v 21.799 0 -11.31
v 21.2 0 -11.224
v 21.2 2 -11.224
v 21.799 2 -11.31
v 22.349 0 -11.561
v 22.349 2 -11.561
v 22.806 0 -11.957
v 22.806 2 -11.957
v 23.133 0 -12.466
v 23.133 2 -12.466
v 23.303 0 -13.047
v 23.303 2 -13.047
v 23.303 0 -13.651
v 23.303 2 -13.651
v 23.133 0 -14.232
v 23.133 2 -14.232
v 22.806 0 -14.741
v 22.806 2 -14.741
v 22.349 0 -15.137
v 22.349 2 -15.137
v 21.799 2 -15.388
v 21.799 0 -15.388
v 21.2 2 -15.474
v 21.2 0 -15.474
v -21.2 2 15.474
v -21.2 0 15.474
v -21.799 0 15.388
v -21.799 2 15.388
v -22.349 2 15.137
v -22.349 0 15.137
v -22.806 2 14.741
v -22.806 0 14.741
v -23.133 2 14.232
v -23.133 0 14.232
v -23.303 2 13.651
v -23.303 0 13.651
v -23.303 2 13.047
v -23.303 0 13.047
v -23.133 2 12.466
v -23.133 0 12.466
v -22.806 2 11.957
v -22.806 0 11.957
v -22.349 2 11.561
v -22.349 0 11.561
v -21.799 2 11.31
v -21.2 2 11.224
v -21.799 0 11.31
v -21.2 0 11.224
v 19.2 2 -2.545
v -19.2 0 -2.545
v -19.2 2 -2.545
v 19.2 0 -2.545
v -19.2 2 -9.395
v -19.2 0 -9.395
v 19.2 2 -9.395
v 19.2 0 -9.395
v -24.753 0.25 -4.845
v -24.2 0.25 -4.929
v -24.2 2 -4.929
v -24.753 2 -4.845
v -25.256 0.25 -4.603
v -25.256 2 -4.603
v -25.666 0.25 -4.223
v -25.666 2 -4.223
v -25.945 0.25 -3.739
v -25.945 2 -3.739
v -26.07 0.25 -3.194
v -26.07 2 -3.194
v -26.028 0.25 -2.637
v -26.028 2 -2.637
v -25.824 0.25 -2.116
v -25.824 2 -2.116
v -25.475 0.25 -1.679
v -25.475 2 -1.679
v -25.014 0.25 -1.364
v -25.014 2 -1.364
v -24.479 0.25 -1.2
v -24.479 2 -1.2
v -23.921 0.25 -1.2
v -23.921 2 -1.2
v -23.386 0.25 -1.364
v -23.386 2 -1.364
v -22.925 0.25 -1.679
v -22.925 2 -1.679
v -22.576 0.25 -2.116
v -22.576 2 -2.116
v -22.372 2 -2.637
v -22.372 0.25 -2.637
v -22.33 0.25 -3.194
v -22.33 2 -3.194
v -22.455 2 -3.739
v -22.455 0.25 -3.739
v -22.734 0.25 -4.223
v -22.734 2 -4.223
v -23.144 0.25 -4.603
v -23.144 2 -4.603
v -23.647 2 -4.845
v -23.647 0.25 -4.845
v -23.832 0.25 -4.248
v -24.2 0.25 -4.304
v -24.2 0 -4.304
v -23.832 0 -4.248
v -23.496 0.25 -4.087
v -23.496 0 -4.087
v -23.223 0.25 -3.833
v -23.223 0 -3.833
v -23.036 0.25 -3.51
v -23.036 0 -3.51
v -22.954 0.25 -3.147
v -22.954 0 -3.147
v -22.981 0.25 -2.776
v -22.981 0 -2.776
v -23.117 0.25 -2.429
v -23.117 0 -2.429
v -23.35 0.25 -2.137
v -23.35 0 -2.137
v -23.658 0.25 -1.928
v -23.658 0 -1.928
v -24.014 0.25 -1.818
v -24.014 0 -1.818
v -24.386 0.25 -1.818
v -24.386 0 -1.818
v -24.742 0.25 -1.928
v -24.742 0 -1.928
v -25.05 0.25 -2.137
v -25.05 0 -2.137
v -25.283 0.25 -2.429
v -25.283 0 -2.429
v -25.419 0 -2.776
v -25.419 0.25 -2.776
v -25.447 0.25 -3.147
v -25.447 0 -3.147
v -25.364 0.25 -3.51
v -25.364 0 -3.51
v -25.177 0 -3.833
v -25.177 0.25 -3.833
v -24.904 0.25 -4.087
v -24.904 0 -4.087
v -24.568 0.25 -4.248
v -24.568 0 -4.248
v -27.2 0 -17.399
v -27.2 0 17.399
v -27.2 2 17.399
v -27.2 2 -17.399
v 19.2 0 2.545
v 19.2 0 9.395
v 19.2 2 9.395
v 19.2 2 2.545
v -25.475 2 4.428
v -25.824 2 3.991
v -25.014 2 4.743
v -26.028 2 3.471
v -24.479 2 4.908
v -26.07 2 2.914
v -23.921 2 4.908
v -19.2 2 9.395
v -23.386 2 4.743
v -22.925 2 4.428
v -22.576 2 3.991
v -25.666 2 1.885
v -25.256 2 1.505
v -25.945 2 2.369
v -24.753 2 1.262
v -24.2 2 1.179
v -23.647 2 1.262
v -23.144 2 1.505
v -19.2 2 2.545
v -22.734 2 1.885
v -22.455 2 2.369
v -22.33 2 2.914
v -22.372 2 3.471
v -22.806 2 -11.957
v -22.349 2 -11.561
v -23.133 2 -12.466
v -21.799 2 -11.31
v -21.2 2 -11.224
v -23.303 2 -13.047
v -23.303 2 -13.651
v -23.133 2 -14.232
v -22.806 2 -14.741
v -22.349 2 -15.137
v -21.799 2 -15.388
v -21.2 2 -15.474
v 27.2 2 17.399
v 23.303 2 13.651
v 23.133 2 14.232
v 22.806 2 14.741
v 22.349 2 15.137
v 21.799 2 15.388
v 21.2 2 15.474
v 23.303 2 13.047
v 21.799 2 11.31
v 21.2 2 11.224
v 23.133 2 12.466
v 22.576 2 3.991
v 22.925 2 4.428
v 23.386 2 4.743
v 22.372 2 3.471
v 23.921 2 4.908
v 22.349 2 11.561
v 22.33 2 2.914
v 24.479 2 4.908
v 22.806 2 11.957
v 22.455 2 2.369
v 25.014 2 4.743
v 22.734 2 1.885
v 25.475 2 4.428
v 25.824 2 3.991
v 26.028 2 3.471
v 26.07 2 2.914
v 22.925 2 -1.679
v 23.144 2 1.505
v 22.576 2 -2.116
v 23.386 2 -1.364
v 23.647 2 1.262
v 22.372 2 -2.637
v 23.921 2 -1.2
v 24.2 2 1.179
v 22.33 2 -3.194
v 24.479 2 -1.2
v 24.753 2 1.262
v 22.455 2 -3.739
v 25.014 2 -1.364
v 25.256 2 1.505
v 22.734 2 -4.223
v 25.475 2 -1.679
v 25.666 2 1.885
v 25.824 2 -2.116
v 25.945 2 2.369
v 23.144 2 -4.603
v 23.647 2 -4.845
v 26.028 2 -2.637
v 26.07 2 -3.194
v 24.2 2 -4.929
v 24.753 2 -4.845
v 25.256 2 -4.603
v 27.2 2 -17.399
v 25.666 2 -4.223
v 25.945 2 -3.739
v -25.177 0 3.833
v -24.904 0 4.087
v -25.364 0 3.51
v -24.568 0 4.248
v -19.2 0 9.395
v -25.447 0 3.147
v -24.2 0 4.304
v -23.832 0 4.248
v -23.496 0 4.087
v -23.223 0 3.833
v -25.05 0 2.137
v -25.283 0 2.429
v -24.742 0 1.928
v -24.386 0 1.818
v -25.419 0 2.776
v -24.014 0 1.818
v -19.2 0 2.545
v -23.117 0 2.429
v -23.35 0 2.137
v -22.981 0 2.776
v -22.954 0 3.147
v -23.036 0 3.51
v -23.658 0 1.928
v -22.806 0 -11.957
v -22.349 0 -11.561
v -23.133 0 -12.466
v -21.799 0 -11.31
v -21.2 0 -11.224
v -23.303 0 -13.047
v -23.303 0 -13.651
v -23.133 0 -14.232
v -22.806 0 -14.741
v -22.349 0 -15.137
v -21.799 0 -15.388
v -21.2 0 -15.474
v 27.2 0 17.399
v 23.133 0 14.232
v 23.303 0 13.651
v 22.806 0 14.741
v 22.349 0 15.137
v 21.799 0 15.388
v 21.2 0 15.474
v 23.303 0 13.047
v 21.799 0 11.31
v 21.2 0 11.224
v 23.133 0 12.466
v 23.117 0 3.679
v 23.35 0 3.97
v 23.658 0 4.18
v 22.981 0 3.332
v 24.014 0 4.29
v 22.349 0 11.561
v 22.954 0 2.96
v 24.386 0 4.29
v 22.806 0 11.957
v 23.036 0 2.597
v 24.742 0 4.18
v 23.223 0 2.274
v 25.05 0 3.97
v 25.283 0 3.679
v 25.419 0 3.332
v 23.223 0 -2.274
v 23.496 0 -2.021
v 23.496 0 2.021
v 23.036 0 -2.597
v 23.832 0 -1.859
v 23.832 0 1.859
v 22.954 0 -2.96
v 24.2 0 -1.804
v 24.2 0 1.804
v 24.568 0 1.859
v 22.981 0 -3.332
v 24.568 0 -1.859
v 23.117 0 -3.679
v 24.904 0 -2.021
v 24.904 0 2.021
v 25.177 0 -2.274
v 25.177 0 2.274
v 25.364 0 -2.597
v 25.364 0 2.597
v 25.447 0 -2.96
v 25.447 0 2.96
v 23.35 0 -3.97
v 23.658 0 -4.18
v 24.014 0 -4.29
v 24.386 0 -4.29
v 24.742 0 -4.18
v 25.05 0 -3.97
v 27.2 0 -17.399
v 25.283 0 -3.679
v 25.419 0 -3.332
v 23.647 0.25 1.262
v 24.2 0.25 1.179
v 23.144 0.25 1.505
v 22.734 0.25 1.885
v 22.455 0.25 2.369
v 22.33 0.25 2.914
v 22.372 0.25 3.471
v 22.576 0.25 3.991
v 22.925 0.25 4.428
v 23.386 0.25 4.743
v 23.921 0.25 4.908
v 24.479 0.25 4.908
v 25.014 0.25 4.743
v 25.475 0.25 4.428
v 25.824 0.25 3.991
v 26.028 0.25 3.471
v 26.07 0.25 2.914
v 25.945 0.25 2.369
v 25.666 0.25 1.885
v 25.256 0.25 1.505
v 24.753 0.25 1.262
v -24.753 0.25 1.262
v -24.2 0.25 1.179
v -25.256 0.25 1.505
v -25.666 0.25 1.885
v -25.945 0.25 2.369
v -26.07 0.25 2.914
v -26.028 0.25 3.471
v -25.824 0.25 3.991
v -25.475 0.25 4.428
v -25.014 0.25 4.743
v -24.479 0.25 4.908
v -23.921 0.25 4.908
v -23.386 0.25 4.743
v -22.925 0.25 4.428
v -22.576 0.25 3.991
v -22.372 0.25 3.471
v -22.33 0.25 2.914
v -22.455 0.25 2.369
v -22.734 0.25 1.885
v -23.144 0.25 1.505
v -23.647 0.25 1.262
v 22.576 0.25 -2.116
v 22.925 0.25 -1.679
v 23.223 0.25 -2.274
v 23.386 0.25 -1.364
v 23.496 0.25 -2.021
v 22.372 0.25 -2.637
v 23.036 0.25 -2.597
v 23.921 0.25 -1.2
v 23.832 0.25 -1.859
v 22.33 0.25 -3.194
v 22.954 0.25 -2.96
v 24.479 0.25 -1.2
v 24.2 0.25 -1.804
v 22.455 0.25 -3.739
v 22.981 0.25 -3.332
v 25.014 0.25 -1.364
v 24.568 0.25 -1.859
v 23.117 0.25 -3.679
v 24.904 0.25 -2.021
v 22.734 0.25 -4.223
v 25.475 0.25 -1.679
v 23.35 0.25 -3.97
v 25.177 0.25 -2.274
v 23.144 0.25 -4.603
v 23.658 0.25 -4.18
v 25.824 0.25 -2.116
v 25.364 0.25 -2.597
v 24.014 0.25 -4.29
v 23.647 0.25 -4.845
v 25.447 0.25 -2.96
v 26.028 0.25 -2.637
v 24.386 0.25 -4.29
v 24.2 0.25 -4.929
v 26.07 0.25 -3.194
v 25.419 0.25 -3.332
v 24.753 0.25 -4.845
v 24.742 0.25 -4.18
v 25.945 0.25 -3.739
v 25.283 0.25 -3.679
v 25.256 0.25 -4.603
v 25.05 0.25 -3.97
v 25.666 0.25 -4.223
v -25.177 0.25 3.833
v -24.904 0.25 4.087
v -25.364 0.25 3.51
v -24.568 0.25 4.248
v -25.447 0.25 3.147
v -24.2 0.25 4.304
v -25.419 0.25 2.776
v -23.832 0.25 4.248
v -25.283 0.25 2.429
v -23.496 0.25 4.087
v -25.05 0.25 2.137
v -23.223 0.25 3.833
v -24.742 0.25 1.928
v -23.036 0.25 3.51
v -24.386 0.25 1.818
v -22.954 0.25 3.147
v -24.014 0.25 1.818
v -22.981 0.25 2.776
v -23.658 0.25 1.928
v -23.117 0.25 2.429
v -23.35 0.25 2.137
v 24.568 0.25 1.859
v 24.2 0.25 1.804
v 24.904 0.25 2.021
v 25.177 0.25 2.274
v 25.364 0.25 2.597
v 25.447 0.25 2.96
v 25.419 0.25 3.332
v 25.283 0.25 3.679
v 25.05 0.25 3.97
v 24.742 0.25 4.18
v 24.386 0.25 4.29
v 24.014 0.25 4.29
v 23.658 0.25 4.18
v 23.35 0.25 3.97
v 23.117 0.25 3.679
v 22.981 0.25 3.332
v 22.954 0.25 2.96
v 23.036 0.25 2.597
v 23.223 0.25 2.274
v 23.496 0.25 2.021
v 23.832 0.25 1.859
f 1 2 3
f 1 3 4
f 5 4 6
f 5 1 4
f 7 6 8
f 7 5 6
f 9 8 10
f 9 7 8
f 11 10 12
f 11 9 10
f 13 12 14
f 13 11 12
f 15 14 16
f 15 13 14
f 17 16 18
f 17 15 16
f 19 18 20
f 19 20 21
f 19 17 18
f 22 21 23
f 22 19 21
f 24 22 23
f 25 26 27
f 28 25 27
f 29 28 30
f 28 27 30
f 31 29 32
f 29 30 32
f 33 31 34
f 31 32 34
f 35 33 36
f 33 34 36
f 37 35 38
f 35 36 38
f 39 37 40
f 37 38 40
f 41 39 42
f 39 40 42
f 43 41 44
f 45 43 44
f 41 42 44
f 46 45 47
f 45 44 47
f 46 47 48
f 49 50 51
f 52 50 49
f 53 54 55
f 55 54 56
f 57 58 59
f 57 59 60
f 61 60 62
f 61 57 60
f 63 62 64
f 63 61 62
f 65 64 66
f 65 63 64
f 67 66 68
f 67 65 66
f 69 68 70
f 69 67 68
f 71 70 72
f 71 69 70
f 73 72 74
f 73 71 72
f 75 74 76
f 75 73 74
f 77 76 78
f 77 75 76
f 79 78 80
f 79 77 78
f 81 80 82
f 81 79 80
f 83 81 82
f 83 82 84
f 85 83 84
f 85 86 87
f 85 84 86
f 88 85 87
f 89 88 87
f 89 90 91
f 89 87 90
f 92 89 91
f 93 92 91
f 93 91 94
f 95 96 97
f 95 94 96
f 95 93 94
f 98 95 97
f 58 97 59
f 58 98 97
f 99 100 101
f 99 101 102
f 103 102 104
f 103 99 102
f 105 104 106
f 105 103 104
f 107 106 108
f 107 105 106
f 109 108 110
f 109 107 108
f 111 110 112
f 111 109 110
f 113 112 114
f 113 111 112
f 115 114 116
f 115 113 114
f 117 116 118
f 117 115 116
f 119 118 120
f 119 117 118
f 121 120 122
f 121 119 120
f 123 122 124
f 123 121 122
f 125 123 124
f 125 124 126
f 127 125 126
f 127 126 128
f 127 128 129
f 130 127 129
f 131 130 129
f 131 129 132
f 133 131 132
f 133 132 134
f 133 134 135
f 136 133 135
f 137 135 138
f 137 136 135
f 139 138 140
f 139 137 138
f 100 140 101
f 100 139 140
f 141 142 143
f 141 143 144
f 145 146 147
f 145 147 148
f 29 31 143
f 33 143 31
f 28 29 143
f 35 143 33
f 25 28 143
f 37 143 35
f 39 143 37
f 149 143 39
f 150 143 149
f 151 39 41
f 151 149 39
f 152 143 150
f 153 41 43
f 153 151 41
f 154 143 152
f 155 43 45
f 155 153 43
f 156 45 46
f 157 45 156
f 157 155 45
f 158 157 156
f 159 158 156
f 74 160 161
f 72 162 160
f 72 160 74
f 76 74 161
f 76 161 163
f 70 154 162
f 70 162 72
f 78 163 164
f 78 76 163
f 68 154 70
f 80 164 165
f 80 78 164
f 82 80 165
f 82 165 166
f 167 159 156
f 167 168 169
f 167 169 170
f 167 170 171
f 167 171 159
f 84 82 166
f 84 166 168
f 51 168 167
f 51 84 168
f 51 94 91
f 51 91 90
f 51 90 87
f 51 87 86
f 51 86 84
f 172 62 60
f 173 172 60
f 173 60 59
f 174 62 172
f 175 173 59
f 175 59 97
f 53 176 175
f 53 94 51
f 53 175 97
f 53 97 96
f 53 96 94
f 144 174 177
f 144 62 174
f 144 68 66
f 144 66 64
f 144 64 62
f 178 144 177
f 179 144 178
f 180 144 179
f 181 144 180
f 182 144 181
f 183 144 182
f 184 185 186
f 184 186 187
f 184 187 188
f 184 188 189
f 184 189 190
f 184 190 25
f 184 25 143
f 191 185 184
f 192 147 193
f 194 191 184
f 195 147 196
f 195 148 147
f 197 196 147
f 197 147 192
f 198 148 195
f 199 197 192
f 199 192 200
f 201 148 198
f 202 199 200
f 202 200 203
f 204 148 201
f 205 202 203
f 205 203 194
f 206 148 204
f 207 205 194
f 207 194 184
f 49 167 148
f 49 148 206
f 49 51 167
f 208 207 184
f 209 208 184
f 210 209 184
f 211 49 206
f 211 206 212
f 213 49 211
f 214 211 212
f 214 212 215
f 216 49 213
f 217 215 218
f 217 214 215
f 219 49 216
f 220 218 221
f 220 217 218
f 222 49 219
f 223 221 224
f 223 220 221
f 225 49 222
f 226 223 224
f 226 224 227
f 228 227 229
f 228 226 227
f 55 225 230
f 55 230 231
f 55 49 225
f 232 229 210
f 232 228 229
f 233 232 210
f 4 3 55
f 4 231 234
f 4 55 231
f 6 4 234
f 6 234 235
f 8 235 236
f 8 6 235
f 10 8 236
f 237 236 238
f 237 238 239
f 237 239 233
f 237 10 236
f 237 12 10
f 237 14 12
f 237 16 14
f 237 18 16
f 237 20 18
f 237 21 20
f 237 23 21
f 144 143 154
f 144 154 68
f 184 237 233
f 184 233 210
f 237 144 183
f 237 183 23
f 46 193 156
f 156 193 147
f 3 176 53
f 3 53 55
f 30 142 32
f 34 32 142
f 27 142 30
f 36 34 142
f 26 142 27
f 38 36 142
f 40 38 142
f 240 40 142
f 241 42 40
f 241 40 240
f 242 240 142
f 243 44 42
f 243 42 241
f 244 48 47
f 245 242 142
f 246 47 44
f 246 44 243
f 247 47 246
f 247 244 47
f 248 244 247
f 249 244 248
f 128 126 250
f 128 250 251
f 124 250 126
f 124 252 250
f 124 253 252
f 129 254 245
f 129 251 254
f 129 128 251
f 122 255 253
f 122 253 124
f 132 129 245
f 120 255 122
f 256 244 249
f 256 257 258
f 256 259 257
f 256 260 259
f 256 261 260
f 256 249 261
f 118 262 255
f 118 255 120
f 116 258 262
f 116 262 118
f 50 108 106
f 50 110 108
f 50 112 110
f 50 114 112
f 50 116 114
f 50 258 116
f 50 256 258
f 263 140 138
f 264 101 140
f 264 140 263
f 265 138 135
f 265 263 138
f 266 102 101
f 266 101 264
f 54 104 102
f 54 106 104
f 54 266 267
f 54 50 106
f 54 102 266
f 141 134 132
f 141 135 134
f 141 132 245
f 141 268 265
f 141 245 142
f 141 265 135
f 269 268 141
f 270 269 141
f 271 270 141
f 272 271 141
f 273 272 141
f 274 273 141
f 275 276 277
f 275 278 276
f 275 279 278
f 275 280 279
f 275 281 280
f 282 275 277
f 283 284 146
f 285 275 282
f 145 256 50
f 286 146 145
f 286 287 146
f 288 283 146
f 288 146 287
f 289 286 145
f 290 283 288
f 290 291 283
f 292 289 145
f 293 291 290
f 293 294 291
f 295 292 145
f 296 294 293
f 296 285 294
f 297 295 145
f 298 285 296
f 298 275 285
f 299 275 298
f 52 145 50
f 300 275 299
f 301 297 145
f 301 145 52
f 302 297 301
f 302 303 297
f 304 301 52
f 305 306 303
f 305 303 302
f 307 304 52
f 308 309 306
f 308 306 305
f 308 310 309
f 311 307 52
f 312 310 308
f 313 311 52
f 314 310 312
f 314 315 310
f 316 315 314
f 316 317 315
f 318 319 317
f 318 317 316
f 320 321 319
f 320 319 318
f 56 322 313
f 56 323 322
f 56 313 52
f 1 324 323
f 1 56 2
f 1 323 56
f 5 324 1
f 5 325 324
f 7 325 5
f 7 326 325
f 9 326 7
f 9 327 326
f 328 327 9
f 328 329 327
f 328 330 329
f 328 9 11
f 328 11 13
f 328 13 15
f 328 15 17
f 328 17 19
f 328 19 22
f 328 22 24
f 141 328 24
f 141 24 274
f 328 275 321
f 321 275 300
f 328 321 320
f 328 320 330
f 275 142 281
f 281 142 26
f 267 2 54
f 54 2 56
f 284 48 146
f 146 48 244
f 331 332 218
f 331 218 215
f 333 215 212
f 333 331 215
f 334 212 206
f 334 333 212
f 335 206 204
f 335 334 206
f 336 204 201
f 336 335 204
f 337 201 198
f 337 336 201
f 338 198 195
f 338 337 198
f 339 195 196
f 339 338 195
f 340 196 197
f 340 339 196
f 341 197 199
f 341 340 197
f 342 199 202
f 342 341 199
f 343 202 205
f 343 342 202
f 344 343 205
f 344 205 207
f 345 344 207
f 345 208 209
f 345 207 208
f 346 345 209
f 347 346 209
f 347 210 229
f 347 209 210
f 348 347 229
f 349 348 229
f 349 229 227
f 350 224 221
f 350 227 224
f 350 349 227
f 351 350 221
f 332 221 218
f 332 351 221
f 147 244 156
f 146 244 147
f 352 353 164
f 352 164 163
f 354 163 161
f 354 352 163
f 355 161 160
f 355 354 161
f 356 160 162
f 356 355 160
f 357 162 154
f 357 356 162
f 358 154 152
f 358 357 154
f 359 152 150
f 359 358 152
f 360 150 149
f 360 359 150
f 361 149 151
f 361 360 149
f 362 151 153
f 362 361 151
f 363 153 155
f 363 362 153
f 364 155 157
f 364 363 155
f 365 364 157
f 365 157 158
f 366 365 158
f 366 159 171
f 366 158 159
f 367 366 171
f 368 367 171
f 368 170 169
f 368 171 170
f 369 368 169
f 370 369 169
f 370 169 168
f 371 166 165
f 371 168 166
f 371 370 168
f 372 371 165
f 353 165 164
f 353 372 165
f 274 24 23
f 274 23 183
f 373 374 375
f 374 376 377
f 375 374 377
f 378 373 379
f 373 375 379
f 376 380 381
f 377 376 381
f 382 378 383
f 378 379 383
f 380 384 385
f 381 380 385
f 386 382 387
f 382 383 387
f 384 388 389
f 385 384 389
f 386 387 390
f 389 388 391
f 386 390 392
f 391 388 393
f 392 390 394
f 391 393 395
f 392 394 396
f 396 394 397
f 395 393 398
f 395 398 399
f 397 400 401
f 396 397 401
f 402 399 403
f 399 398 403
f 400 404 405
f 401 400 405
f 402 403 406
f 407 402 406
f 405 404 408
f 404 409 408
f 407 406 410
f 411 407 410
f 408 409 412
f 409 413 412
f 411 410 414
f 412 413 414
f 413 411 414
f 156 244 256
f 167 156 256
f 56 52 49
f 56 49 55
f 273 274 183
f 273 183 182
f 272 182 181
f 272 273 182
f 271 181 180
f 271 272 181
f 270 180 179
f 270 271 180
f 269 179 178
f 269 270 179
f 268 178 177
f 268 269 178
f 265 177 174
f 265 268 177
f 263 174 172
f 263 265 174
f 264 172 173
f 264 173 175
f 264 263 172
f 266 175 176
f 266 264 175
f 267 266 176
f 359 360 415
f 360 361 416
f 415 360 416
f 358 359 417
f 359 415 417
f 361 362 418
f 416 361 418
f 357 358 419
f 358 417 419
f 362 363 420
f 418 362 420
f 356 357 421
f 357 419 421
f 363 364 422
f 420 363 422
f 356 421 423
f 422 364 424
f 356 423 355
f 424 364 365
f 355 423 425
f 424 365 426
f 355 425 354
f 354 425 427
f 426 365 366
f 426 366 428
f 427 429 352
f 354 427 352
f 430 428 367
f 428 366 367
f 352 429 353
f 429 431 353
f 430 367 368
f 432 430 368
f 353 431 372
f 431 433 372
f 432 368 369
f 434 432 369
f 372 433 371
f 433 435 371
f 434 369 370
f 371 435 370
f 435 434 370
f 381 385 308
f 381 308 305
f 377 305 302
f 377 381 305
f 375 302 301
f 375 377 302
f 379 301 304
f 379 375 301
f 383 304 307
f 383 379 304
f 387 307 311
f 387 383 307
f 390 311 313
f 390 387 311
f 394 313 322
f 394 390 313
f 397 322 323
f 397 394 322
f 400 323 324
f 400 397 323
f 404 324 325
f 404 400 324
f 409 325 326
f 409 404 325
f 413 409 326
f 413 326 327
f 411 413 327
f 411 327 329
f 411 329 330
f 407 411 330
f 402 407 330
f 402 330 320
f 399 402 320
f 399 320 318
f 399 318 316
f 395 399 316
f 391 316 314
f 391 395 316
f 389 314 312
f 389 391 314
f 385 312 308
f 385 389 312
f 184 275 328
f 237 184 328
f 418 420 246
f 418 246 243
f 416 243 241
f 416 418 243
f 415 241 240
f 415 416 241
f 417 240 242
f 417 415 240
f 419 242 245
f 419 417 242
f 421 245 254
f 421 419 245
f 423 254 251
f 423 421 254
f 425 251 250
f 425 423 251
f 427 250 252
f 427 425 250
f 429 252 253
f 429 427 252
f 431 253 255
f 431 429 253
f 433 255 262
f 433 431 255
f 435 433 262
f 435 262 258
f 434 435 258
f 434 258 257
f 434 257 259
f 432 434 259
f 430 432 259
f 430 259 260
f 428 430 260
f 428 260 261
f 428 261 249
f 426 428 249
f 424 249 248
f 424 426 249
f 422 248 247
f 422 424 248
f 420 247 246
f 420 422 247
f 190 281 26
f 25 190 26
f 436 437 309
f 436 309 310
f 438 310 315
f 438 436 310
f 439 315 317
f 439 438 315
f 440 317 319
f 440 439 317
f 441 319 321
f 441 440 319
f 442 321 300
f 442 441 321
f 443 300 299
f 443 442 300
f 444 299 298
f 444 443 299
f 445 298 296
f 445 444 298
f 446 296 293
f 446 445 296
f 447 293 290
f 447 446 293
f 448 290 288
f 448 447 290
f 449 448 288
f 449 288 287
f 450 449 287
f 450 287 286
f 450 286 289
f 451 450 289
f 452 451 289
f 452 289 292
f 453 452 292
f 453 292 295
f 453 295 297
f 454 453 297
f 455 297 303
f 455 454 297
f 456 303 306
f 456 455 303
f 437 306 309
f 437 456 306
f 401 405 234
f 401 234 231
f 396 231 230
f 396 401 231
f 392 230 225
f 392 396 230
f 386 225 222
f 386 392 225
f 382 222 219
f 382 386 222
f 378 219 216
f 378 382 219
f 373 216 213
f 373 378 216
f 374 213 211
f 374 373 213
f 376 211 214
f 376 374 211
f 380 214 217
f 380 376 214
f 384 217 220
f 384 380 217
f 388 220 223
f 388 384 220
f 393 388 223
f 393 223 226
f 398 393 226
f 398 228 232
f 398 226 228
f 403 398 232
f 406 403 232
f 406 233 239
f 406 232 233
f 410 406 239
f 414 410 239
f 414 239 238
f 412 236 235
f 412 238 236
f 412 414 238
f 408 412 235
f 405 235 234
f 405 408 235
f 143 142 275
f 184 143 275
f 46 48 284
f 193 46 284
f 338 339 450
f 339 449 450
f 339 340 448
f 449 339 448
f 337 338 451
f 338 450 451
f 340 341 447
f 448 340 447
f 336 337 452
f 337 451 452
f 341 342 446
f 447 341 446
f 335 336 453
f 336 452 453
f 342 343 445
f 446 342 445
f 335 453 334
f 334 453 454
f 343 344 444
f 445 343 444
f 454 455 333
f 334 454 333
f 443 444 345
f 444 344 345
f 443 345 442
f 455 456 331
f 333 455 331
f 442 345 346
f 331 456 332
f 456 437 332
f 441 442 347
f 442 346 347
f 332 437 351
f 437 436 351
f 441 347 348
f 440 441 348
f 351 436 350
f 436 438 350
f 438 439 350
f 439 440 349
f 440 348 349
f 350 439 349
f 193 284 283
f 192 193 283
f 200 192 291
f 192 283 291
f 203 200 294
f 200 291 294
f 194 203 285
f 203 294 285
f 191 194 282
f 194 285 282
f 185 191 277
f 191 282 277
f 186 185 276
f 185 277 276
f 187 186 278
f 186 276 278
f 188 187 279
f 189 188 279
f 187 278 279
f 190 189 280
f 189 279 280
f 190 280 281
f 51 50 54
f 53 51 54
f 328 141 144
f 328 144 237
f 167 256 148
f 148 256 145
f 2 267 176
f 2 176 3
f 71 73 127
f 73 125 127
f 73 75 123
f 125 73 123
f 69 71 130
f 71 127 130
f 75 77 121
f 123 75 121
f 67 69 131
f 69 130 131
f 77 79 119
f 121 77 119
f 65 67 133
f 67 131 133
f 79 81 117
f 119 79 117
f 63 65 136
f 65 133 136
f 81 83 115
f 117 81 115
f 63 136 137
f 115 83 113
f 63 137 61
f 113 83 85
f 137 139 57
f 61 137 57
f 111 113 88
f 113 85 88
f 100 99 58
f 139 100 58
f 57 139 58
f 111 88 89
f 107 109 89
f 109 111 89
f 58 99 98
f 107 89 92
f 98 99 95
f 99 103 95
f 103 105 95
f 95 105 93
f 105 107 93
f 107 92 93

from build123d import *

# Parameters (mm, degrees)
SKETCH1_W               = 54.3999928
SKETCH1_H               = 34.798
SKETCH1_W_2             = 38.3999994
SKETCH1_H_2             = 6.849999
BOSS_EXTRUDE1_DEPTH     = 1.999996
CUT_EXTRUDE1_DEPTH      = 33.350656704
CUT_EXTRUDE1_DEPTH_BACK = 5.5500016
SKETCH2_R               = 1.8750026
BOSS_EXTRUDE2_START     = -0.2500122
SKETCH3_R               = 1.8750026
SKETCH3_R_2             = 1.2499975
BOSS_EXTRUDE2_DEPTH     = 0.2500122


with BuildPart() as part:
    # Sketch1 → Boss-Extrude1 (new body)
    with BuildSketch(Plane(origin=(0, 0, 0), x_dir=(1, 0, 0), z_dir=(0, 1, 0))):
        Rectangle(SKETCH1_W, SKETCH1_H)
        with BuildLine():
            Line((-21.2000084, -11.224006), (21.2000084, -11.224006))
            ThreePointArc((21.2000084, -11.224006), (23.3250105, -13.3490081), (21.2000084, -15.4740102))
            Line((21.2000084, -15.4740102), (-21.2000084, -15.4740102))
            ThreePointArc((-21.2000084, -15.4740102), (-23.3250105, -13.3490081), (-21.2000084, -11.224006))
        make_face(mode=Mode.SUBTRACT)
        with BuildLine():
            Line((-21.2000084, 11.224006), (21.2000084, 11.224006))
            ThreePointArc((21.2000084, 11.224006), (23.3250105, 13.3490081), (21.2000084, 15.4740102))
            Line((21.2000084, 15.4740102), (-21.2000084, 15.4740102))
            ThreePointArc((-21.2000084, 15.4740102), (-23.3250105, 13.3490081), (-21.2000084, 11.224006))
        make_face(mode=Mode.SUBTRACT)
        with Locations((-1.27e-05, 5.9702065)):
            Rectangle(SKETCH1_W_2, SKETCH1_H_2, mode=Mode.SUBTRACT)
        with Locations((-1.27e-05, -5.9702065)):
            Rectangle(SKETCH1_W_2, SKETCH1_H_2, mode=Mode.SUBTRACT)
    extrude(amount=BOSS_EXTRUDE1_DEPTH)

    # Sketch2 → Cut-Extrude1 (cut, two sides: drawn at the far end of the back side and taken through both)
    with BuildSketch(Plane(origin=(0, 1.999996, 0), x_dir=(1, 0, 0), z_dir=(0, 1, 0)).offset(-CUT_EXTRUDE1_DEPTH_BACK)):
        with Locations(Location((-24.2000278, -3.0537912, 0), (0, 0, 90))):
            Circle(SKETCH2_R)
        with Locations(Location((-24.2000278, 3.0537912, 0), (0, 0, 90))):
            Circle(SKETCH2_R)
        with Locations(Location((24.2000278, 3.0537912, 0), (0, 0, 90))):
            Circle(SKETCH2_R)
        with Locations(Location((24.2000278, -3.0537912, 0), (0, 0, 90))):
            Circle(SKETCH2_R)
    extrude(amount=CUT_EXTRUDE1_DEPTH + CUT_EXTRUDE1_DEPTH_BACK, mode=Mode.SUBTRACT)

    # Sketch3 → Boss-Extrude2 (add)
    # profile 1 of 4: a face of its own
    with BuildSketch(Plane.XZ.offset(BOSS_EXTRUDE2_START)):
        with Locations(Location((-24.2000278, 3.0537912, 0), (0, 0, 270))):
            Circle(SKETCH3_R)
        with Locations(Location((-24.2000278, 3.0537912, 0), (0, 0, 90))):
            Circle(SKETCH3_R_2, mode=Mode.SUBTRACT)
    # profile 2 of 4: a face of its own
    with BuildSketch(Plane.XZ.offset(BOSS_EXTRUDE2_START)):
        with Locations(Location((-24.2000278, -3.0537912, 0), (0, 0, 270))):
            Circle(SKETCH3_R)
        with Locations(Location((-24.2000278, -3.0537912, 0), (0, 0, 270))):
            Circle(SKETCH3_R_2, mode=Mode.SUBTRACT)
    # profile 3 of 4: a face of its own
    with BuildSketch(Plane.XZ.offset(BOSS_EXTRUDE2_START)):
        with Locations(Location((24.2000278, -3.0537912, 0), (0, 0, 270))):
            Circle(SKETCH3_R)
        with Locations(Location((24.2000278, -3.0537912, 0), (0, 0, 90))):
            Circle(SKETCH3_R_2, mode=Mode.SUBTRACT)
    # profile 4 of 4: a face of its own
    with BuildSketch(Plane.XZ.offset(BOSS_EXTRUDE2_START)):
        with Locations(Location((24.2000278, 3.0537912, 0), (0, 0, 270))):
            Circle(SKETCH3_R)
        with Locations(Location((24.2000278, 3.0537912, 0), (0, 0, 270))):
            Circle(SKETCH3_R_2, mode=Mode.SUBTRACT)
    extrude(amount=BOSS_EXTRUDE2_DEPTH)


solid = part.part
